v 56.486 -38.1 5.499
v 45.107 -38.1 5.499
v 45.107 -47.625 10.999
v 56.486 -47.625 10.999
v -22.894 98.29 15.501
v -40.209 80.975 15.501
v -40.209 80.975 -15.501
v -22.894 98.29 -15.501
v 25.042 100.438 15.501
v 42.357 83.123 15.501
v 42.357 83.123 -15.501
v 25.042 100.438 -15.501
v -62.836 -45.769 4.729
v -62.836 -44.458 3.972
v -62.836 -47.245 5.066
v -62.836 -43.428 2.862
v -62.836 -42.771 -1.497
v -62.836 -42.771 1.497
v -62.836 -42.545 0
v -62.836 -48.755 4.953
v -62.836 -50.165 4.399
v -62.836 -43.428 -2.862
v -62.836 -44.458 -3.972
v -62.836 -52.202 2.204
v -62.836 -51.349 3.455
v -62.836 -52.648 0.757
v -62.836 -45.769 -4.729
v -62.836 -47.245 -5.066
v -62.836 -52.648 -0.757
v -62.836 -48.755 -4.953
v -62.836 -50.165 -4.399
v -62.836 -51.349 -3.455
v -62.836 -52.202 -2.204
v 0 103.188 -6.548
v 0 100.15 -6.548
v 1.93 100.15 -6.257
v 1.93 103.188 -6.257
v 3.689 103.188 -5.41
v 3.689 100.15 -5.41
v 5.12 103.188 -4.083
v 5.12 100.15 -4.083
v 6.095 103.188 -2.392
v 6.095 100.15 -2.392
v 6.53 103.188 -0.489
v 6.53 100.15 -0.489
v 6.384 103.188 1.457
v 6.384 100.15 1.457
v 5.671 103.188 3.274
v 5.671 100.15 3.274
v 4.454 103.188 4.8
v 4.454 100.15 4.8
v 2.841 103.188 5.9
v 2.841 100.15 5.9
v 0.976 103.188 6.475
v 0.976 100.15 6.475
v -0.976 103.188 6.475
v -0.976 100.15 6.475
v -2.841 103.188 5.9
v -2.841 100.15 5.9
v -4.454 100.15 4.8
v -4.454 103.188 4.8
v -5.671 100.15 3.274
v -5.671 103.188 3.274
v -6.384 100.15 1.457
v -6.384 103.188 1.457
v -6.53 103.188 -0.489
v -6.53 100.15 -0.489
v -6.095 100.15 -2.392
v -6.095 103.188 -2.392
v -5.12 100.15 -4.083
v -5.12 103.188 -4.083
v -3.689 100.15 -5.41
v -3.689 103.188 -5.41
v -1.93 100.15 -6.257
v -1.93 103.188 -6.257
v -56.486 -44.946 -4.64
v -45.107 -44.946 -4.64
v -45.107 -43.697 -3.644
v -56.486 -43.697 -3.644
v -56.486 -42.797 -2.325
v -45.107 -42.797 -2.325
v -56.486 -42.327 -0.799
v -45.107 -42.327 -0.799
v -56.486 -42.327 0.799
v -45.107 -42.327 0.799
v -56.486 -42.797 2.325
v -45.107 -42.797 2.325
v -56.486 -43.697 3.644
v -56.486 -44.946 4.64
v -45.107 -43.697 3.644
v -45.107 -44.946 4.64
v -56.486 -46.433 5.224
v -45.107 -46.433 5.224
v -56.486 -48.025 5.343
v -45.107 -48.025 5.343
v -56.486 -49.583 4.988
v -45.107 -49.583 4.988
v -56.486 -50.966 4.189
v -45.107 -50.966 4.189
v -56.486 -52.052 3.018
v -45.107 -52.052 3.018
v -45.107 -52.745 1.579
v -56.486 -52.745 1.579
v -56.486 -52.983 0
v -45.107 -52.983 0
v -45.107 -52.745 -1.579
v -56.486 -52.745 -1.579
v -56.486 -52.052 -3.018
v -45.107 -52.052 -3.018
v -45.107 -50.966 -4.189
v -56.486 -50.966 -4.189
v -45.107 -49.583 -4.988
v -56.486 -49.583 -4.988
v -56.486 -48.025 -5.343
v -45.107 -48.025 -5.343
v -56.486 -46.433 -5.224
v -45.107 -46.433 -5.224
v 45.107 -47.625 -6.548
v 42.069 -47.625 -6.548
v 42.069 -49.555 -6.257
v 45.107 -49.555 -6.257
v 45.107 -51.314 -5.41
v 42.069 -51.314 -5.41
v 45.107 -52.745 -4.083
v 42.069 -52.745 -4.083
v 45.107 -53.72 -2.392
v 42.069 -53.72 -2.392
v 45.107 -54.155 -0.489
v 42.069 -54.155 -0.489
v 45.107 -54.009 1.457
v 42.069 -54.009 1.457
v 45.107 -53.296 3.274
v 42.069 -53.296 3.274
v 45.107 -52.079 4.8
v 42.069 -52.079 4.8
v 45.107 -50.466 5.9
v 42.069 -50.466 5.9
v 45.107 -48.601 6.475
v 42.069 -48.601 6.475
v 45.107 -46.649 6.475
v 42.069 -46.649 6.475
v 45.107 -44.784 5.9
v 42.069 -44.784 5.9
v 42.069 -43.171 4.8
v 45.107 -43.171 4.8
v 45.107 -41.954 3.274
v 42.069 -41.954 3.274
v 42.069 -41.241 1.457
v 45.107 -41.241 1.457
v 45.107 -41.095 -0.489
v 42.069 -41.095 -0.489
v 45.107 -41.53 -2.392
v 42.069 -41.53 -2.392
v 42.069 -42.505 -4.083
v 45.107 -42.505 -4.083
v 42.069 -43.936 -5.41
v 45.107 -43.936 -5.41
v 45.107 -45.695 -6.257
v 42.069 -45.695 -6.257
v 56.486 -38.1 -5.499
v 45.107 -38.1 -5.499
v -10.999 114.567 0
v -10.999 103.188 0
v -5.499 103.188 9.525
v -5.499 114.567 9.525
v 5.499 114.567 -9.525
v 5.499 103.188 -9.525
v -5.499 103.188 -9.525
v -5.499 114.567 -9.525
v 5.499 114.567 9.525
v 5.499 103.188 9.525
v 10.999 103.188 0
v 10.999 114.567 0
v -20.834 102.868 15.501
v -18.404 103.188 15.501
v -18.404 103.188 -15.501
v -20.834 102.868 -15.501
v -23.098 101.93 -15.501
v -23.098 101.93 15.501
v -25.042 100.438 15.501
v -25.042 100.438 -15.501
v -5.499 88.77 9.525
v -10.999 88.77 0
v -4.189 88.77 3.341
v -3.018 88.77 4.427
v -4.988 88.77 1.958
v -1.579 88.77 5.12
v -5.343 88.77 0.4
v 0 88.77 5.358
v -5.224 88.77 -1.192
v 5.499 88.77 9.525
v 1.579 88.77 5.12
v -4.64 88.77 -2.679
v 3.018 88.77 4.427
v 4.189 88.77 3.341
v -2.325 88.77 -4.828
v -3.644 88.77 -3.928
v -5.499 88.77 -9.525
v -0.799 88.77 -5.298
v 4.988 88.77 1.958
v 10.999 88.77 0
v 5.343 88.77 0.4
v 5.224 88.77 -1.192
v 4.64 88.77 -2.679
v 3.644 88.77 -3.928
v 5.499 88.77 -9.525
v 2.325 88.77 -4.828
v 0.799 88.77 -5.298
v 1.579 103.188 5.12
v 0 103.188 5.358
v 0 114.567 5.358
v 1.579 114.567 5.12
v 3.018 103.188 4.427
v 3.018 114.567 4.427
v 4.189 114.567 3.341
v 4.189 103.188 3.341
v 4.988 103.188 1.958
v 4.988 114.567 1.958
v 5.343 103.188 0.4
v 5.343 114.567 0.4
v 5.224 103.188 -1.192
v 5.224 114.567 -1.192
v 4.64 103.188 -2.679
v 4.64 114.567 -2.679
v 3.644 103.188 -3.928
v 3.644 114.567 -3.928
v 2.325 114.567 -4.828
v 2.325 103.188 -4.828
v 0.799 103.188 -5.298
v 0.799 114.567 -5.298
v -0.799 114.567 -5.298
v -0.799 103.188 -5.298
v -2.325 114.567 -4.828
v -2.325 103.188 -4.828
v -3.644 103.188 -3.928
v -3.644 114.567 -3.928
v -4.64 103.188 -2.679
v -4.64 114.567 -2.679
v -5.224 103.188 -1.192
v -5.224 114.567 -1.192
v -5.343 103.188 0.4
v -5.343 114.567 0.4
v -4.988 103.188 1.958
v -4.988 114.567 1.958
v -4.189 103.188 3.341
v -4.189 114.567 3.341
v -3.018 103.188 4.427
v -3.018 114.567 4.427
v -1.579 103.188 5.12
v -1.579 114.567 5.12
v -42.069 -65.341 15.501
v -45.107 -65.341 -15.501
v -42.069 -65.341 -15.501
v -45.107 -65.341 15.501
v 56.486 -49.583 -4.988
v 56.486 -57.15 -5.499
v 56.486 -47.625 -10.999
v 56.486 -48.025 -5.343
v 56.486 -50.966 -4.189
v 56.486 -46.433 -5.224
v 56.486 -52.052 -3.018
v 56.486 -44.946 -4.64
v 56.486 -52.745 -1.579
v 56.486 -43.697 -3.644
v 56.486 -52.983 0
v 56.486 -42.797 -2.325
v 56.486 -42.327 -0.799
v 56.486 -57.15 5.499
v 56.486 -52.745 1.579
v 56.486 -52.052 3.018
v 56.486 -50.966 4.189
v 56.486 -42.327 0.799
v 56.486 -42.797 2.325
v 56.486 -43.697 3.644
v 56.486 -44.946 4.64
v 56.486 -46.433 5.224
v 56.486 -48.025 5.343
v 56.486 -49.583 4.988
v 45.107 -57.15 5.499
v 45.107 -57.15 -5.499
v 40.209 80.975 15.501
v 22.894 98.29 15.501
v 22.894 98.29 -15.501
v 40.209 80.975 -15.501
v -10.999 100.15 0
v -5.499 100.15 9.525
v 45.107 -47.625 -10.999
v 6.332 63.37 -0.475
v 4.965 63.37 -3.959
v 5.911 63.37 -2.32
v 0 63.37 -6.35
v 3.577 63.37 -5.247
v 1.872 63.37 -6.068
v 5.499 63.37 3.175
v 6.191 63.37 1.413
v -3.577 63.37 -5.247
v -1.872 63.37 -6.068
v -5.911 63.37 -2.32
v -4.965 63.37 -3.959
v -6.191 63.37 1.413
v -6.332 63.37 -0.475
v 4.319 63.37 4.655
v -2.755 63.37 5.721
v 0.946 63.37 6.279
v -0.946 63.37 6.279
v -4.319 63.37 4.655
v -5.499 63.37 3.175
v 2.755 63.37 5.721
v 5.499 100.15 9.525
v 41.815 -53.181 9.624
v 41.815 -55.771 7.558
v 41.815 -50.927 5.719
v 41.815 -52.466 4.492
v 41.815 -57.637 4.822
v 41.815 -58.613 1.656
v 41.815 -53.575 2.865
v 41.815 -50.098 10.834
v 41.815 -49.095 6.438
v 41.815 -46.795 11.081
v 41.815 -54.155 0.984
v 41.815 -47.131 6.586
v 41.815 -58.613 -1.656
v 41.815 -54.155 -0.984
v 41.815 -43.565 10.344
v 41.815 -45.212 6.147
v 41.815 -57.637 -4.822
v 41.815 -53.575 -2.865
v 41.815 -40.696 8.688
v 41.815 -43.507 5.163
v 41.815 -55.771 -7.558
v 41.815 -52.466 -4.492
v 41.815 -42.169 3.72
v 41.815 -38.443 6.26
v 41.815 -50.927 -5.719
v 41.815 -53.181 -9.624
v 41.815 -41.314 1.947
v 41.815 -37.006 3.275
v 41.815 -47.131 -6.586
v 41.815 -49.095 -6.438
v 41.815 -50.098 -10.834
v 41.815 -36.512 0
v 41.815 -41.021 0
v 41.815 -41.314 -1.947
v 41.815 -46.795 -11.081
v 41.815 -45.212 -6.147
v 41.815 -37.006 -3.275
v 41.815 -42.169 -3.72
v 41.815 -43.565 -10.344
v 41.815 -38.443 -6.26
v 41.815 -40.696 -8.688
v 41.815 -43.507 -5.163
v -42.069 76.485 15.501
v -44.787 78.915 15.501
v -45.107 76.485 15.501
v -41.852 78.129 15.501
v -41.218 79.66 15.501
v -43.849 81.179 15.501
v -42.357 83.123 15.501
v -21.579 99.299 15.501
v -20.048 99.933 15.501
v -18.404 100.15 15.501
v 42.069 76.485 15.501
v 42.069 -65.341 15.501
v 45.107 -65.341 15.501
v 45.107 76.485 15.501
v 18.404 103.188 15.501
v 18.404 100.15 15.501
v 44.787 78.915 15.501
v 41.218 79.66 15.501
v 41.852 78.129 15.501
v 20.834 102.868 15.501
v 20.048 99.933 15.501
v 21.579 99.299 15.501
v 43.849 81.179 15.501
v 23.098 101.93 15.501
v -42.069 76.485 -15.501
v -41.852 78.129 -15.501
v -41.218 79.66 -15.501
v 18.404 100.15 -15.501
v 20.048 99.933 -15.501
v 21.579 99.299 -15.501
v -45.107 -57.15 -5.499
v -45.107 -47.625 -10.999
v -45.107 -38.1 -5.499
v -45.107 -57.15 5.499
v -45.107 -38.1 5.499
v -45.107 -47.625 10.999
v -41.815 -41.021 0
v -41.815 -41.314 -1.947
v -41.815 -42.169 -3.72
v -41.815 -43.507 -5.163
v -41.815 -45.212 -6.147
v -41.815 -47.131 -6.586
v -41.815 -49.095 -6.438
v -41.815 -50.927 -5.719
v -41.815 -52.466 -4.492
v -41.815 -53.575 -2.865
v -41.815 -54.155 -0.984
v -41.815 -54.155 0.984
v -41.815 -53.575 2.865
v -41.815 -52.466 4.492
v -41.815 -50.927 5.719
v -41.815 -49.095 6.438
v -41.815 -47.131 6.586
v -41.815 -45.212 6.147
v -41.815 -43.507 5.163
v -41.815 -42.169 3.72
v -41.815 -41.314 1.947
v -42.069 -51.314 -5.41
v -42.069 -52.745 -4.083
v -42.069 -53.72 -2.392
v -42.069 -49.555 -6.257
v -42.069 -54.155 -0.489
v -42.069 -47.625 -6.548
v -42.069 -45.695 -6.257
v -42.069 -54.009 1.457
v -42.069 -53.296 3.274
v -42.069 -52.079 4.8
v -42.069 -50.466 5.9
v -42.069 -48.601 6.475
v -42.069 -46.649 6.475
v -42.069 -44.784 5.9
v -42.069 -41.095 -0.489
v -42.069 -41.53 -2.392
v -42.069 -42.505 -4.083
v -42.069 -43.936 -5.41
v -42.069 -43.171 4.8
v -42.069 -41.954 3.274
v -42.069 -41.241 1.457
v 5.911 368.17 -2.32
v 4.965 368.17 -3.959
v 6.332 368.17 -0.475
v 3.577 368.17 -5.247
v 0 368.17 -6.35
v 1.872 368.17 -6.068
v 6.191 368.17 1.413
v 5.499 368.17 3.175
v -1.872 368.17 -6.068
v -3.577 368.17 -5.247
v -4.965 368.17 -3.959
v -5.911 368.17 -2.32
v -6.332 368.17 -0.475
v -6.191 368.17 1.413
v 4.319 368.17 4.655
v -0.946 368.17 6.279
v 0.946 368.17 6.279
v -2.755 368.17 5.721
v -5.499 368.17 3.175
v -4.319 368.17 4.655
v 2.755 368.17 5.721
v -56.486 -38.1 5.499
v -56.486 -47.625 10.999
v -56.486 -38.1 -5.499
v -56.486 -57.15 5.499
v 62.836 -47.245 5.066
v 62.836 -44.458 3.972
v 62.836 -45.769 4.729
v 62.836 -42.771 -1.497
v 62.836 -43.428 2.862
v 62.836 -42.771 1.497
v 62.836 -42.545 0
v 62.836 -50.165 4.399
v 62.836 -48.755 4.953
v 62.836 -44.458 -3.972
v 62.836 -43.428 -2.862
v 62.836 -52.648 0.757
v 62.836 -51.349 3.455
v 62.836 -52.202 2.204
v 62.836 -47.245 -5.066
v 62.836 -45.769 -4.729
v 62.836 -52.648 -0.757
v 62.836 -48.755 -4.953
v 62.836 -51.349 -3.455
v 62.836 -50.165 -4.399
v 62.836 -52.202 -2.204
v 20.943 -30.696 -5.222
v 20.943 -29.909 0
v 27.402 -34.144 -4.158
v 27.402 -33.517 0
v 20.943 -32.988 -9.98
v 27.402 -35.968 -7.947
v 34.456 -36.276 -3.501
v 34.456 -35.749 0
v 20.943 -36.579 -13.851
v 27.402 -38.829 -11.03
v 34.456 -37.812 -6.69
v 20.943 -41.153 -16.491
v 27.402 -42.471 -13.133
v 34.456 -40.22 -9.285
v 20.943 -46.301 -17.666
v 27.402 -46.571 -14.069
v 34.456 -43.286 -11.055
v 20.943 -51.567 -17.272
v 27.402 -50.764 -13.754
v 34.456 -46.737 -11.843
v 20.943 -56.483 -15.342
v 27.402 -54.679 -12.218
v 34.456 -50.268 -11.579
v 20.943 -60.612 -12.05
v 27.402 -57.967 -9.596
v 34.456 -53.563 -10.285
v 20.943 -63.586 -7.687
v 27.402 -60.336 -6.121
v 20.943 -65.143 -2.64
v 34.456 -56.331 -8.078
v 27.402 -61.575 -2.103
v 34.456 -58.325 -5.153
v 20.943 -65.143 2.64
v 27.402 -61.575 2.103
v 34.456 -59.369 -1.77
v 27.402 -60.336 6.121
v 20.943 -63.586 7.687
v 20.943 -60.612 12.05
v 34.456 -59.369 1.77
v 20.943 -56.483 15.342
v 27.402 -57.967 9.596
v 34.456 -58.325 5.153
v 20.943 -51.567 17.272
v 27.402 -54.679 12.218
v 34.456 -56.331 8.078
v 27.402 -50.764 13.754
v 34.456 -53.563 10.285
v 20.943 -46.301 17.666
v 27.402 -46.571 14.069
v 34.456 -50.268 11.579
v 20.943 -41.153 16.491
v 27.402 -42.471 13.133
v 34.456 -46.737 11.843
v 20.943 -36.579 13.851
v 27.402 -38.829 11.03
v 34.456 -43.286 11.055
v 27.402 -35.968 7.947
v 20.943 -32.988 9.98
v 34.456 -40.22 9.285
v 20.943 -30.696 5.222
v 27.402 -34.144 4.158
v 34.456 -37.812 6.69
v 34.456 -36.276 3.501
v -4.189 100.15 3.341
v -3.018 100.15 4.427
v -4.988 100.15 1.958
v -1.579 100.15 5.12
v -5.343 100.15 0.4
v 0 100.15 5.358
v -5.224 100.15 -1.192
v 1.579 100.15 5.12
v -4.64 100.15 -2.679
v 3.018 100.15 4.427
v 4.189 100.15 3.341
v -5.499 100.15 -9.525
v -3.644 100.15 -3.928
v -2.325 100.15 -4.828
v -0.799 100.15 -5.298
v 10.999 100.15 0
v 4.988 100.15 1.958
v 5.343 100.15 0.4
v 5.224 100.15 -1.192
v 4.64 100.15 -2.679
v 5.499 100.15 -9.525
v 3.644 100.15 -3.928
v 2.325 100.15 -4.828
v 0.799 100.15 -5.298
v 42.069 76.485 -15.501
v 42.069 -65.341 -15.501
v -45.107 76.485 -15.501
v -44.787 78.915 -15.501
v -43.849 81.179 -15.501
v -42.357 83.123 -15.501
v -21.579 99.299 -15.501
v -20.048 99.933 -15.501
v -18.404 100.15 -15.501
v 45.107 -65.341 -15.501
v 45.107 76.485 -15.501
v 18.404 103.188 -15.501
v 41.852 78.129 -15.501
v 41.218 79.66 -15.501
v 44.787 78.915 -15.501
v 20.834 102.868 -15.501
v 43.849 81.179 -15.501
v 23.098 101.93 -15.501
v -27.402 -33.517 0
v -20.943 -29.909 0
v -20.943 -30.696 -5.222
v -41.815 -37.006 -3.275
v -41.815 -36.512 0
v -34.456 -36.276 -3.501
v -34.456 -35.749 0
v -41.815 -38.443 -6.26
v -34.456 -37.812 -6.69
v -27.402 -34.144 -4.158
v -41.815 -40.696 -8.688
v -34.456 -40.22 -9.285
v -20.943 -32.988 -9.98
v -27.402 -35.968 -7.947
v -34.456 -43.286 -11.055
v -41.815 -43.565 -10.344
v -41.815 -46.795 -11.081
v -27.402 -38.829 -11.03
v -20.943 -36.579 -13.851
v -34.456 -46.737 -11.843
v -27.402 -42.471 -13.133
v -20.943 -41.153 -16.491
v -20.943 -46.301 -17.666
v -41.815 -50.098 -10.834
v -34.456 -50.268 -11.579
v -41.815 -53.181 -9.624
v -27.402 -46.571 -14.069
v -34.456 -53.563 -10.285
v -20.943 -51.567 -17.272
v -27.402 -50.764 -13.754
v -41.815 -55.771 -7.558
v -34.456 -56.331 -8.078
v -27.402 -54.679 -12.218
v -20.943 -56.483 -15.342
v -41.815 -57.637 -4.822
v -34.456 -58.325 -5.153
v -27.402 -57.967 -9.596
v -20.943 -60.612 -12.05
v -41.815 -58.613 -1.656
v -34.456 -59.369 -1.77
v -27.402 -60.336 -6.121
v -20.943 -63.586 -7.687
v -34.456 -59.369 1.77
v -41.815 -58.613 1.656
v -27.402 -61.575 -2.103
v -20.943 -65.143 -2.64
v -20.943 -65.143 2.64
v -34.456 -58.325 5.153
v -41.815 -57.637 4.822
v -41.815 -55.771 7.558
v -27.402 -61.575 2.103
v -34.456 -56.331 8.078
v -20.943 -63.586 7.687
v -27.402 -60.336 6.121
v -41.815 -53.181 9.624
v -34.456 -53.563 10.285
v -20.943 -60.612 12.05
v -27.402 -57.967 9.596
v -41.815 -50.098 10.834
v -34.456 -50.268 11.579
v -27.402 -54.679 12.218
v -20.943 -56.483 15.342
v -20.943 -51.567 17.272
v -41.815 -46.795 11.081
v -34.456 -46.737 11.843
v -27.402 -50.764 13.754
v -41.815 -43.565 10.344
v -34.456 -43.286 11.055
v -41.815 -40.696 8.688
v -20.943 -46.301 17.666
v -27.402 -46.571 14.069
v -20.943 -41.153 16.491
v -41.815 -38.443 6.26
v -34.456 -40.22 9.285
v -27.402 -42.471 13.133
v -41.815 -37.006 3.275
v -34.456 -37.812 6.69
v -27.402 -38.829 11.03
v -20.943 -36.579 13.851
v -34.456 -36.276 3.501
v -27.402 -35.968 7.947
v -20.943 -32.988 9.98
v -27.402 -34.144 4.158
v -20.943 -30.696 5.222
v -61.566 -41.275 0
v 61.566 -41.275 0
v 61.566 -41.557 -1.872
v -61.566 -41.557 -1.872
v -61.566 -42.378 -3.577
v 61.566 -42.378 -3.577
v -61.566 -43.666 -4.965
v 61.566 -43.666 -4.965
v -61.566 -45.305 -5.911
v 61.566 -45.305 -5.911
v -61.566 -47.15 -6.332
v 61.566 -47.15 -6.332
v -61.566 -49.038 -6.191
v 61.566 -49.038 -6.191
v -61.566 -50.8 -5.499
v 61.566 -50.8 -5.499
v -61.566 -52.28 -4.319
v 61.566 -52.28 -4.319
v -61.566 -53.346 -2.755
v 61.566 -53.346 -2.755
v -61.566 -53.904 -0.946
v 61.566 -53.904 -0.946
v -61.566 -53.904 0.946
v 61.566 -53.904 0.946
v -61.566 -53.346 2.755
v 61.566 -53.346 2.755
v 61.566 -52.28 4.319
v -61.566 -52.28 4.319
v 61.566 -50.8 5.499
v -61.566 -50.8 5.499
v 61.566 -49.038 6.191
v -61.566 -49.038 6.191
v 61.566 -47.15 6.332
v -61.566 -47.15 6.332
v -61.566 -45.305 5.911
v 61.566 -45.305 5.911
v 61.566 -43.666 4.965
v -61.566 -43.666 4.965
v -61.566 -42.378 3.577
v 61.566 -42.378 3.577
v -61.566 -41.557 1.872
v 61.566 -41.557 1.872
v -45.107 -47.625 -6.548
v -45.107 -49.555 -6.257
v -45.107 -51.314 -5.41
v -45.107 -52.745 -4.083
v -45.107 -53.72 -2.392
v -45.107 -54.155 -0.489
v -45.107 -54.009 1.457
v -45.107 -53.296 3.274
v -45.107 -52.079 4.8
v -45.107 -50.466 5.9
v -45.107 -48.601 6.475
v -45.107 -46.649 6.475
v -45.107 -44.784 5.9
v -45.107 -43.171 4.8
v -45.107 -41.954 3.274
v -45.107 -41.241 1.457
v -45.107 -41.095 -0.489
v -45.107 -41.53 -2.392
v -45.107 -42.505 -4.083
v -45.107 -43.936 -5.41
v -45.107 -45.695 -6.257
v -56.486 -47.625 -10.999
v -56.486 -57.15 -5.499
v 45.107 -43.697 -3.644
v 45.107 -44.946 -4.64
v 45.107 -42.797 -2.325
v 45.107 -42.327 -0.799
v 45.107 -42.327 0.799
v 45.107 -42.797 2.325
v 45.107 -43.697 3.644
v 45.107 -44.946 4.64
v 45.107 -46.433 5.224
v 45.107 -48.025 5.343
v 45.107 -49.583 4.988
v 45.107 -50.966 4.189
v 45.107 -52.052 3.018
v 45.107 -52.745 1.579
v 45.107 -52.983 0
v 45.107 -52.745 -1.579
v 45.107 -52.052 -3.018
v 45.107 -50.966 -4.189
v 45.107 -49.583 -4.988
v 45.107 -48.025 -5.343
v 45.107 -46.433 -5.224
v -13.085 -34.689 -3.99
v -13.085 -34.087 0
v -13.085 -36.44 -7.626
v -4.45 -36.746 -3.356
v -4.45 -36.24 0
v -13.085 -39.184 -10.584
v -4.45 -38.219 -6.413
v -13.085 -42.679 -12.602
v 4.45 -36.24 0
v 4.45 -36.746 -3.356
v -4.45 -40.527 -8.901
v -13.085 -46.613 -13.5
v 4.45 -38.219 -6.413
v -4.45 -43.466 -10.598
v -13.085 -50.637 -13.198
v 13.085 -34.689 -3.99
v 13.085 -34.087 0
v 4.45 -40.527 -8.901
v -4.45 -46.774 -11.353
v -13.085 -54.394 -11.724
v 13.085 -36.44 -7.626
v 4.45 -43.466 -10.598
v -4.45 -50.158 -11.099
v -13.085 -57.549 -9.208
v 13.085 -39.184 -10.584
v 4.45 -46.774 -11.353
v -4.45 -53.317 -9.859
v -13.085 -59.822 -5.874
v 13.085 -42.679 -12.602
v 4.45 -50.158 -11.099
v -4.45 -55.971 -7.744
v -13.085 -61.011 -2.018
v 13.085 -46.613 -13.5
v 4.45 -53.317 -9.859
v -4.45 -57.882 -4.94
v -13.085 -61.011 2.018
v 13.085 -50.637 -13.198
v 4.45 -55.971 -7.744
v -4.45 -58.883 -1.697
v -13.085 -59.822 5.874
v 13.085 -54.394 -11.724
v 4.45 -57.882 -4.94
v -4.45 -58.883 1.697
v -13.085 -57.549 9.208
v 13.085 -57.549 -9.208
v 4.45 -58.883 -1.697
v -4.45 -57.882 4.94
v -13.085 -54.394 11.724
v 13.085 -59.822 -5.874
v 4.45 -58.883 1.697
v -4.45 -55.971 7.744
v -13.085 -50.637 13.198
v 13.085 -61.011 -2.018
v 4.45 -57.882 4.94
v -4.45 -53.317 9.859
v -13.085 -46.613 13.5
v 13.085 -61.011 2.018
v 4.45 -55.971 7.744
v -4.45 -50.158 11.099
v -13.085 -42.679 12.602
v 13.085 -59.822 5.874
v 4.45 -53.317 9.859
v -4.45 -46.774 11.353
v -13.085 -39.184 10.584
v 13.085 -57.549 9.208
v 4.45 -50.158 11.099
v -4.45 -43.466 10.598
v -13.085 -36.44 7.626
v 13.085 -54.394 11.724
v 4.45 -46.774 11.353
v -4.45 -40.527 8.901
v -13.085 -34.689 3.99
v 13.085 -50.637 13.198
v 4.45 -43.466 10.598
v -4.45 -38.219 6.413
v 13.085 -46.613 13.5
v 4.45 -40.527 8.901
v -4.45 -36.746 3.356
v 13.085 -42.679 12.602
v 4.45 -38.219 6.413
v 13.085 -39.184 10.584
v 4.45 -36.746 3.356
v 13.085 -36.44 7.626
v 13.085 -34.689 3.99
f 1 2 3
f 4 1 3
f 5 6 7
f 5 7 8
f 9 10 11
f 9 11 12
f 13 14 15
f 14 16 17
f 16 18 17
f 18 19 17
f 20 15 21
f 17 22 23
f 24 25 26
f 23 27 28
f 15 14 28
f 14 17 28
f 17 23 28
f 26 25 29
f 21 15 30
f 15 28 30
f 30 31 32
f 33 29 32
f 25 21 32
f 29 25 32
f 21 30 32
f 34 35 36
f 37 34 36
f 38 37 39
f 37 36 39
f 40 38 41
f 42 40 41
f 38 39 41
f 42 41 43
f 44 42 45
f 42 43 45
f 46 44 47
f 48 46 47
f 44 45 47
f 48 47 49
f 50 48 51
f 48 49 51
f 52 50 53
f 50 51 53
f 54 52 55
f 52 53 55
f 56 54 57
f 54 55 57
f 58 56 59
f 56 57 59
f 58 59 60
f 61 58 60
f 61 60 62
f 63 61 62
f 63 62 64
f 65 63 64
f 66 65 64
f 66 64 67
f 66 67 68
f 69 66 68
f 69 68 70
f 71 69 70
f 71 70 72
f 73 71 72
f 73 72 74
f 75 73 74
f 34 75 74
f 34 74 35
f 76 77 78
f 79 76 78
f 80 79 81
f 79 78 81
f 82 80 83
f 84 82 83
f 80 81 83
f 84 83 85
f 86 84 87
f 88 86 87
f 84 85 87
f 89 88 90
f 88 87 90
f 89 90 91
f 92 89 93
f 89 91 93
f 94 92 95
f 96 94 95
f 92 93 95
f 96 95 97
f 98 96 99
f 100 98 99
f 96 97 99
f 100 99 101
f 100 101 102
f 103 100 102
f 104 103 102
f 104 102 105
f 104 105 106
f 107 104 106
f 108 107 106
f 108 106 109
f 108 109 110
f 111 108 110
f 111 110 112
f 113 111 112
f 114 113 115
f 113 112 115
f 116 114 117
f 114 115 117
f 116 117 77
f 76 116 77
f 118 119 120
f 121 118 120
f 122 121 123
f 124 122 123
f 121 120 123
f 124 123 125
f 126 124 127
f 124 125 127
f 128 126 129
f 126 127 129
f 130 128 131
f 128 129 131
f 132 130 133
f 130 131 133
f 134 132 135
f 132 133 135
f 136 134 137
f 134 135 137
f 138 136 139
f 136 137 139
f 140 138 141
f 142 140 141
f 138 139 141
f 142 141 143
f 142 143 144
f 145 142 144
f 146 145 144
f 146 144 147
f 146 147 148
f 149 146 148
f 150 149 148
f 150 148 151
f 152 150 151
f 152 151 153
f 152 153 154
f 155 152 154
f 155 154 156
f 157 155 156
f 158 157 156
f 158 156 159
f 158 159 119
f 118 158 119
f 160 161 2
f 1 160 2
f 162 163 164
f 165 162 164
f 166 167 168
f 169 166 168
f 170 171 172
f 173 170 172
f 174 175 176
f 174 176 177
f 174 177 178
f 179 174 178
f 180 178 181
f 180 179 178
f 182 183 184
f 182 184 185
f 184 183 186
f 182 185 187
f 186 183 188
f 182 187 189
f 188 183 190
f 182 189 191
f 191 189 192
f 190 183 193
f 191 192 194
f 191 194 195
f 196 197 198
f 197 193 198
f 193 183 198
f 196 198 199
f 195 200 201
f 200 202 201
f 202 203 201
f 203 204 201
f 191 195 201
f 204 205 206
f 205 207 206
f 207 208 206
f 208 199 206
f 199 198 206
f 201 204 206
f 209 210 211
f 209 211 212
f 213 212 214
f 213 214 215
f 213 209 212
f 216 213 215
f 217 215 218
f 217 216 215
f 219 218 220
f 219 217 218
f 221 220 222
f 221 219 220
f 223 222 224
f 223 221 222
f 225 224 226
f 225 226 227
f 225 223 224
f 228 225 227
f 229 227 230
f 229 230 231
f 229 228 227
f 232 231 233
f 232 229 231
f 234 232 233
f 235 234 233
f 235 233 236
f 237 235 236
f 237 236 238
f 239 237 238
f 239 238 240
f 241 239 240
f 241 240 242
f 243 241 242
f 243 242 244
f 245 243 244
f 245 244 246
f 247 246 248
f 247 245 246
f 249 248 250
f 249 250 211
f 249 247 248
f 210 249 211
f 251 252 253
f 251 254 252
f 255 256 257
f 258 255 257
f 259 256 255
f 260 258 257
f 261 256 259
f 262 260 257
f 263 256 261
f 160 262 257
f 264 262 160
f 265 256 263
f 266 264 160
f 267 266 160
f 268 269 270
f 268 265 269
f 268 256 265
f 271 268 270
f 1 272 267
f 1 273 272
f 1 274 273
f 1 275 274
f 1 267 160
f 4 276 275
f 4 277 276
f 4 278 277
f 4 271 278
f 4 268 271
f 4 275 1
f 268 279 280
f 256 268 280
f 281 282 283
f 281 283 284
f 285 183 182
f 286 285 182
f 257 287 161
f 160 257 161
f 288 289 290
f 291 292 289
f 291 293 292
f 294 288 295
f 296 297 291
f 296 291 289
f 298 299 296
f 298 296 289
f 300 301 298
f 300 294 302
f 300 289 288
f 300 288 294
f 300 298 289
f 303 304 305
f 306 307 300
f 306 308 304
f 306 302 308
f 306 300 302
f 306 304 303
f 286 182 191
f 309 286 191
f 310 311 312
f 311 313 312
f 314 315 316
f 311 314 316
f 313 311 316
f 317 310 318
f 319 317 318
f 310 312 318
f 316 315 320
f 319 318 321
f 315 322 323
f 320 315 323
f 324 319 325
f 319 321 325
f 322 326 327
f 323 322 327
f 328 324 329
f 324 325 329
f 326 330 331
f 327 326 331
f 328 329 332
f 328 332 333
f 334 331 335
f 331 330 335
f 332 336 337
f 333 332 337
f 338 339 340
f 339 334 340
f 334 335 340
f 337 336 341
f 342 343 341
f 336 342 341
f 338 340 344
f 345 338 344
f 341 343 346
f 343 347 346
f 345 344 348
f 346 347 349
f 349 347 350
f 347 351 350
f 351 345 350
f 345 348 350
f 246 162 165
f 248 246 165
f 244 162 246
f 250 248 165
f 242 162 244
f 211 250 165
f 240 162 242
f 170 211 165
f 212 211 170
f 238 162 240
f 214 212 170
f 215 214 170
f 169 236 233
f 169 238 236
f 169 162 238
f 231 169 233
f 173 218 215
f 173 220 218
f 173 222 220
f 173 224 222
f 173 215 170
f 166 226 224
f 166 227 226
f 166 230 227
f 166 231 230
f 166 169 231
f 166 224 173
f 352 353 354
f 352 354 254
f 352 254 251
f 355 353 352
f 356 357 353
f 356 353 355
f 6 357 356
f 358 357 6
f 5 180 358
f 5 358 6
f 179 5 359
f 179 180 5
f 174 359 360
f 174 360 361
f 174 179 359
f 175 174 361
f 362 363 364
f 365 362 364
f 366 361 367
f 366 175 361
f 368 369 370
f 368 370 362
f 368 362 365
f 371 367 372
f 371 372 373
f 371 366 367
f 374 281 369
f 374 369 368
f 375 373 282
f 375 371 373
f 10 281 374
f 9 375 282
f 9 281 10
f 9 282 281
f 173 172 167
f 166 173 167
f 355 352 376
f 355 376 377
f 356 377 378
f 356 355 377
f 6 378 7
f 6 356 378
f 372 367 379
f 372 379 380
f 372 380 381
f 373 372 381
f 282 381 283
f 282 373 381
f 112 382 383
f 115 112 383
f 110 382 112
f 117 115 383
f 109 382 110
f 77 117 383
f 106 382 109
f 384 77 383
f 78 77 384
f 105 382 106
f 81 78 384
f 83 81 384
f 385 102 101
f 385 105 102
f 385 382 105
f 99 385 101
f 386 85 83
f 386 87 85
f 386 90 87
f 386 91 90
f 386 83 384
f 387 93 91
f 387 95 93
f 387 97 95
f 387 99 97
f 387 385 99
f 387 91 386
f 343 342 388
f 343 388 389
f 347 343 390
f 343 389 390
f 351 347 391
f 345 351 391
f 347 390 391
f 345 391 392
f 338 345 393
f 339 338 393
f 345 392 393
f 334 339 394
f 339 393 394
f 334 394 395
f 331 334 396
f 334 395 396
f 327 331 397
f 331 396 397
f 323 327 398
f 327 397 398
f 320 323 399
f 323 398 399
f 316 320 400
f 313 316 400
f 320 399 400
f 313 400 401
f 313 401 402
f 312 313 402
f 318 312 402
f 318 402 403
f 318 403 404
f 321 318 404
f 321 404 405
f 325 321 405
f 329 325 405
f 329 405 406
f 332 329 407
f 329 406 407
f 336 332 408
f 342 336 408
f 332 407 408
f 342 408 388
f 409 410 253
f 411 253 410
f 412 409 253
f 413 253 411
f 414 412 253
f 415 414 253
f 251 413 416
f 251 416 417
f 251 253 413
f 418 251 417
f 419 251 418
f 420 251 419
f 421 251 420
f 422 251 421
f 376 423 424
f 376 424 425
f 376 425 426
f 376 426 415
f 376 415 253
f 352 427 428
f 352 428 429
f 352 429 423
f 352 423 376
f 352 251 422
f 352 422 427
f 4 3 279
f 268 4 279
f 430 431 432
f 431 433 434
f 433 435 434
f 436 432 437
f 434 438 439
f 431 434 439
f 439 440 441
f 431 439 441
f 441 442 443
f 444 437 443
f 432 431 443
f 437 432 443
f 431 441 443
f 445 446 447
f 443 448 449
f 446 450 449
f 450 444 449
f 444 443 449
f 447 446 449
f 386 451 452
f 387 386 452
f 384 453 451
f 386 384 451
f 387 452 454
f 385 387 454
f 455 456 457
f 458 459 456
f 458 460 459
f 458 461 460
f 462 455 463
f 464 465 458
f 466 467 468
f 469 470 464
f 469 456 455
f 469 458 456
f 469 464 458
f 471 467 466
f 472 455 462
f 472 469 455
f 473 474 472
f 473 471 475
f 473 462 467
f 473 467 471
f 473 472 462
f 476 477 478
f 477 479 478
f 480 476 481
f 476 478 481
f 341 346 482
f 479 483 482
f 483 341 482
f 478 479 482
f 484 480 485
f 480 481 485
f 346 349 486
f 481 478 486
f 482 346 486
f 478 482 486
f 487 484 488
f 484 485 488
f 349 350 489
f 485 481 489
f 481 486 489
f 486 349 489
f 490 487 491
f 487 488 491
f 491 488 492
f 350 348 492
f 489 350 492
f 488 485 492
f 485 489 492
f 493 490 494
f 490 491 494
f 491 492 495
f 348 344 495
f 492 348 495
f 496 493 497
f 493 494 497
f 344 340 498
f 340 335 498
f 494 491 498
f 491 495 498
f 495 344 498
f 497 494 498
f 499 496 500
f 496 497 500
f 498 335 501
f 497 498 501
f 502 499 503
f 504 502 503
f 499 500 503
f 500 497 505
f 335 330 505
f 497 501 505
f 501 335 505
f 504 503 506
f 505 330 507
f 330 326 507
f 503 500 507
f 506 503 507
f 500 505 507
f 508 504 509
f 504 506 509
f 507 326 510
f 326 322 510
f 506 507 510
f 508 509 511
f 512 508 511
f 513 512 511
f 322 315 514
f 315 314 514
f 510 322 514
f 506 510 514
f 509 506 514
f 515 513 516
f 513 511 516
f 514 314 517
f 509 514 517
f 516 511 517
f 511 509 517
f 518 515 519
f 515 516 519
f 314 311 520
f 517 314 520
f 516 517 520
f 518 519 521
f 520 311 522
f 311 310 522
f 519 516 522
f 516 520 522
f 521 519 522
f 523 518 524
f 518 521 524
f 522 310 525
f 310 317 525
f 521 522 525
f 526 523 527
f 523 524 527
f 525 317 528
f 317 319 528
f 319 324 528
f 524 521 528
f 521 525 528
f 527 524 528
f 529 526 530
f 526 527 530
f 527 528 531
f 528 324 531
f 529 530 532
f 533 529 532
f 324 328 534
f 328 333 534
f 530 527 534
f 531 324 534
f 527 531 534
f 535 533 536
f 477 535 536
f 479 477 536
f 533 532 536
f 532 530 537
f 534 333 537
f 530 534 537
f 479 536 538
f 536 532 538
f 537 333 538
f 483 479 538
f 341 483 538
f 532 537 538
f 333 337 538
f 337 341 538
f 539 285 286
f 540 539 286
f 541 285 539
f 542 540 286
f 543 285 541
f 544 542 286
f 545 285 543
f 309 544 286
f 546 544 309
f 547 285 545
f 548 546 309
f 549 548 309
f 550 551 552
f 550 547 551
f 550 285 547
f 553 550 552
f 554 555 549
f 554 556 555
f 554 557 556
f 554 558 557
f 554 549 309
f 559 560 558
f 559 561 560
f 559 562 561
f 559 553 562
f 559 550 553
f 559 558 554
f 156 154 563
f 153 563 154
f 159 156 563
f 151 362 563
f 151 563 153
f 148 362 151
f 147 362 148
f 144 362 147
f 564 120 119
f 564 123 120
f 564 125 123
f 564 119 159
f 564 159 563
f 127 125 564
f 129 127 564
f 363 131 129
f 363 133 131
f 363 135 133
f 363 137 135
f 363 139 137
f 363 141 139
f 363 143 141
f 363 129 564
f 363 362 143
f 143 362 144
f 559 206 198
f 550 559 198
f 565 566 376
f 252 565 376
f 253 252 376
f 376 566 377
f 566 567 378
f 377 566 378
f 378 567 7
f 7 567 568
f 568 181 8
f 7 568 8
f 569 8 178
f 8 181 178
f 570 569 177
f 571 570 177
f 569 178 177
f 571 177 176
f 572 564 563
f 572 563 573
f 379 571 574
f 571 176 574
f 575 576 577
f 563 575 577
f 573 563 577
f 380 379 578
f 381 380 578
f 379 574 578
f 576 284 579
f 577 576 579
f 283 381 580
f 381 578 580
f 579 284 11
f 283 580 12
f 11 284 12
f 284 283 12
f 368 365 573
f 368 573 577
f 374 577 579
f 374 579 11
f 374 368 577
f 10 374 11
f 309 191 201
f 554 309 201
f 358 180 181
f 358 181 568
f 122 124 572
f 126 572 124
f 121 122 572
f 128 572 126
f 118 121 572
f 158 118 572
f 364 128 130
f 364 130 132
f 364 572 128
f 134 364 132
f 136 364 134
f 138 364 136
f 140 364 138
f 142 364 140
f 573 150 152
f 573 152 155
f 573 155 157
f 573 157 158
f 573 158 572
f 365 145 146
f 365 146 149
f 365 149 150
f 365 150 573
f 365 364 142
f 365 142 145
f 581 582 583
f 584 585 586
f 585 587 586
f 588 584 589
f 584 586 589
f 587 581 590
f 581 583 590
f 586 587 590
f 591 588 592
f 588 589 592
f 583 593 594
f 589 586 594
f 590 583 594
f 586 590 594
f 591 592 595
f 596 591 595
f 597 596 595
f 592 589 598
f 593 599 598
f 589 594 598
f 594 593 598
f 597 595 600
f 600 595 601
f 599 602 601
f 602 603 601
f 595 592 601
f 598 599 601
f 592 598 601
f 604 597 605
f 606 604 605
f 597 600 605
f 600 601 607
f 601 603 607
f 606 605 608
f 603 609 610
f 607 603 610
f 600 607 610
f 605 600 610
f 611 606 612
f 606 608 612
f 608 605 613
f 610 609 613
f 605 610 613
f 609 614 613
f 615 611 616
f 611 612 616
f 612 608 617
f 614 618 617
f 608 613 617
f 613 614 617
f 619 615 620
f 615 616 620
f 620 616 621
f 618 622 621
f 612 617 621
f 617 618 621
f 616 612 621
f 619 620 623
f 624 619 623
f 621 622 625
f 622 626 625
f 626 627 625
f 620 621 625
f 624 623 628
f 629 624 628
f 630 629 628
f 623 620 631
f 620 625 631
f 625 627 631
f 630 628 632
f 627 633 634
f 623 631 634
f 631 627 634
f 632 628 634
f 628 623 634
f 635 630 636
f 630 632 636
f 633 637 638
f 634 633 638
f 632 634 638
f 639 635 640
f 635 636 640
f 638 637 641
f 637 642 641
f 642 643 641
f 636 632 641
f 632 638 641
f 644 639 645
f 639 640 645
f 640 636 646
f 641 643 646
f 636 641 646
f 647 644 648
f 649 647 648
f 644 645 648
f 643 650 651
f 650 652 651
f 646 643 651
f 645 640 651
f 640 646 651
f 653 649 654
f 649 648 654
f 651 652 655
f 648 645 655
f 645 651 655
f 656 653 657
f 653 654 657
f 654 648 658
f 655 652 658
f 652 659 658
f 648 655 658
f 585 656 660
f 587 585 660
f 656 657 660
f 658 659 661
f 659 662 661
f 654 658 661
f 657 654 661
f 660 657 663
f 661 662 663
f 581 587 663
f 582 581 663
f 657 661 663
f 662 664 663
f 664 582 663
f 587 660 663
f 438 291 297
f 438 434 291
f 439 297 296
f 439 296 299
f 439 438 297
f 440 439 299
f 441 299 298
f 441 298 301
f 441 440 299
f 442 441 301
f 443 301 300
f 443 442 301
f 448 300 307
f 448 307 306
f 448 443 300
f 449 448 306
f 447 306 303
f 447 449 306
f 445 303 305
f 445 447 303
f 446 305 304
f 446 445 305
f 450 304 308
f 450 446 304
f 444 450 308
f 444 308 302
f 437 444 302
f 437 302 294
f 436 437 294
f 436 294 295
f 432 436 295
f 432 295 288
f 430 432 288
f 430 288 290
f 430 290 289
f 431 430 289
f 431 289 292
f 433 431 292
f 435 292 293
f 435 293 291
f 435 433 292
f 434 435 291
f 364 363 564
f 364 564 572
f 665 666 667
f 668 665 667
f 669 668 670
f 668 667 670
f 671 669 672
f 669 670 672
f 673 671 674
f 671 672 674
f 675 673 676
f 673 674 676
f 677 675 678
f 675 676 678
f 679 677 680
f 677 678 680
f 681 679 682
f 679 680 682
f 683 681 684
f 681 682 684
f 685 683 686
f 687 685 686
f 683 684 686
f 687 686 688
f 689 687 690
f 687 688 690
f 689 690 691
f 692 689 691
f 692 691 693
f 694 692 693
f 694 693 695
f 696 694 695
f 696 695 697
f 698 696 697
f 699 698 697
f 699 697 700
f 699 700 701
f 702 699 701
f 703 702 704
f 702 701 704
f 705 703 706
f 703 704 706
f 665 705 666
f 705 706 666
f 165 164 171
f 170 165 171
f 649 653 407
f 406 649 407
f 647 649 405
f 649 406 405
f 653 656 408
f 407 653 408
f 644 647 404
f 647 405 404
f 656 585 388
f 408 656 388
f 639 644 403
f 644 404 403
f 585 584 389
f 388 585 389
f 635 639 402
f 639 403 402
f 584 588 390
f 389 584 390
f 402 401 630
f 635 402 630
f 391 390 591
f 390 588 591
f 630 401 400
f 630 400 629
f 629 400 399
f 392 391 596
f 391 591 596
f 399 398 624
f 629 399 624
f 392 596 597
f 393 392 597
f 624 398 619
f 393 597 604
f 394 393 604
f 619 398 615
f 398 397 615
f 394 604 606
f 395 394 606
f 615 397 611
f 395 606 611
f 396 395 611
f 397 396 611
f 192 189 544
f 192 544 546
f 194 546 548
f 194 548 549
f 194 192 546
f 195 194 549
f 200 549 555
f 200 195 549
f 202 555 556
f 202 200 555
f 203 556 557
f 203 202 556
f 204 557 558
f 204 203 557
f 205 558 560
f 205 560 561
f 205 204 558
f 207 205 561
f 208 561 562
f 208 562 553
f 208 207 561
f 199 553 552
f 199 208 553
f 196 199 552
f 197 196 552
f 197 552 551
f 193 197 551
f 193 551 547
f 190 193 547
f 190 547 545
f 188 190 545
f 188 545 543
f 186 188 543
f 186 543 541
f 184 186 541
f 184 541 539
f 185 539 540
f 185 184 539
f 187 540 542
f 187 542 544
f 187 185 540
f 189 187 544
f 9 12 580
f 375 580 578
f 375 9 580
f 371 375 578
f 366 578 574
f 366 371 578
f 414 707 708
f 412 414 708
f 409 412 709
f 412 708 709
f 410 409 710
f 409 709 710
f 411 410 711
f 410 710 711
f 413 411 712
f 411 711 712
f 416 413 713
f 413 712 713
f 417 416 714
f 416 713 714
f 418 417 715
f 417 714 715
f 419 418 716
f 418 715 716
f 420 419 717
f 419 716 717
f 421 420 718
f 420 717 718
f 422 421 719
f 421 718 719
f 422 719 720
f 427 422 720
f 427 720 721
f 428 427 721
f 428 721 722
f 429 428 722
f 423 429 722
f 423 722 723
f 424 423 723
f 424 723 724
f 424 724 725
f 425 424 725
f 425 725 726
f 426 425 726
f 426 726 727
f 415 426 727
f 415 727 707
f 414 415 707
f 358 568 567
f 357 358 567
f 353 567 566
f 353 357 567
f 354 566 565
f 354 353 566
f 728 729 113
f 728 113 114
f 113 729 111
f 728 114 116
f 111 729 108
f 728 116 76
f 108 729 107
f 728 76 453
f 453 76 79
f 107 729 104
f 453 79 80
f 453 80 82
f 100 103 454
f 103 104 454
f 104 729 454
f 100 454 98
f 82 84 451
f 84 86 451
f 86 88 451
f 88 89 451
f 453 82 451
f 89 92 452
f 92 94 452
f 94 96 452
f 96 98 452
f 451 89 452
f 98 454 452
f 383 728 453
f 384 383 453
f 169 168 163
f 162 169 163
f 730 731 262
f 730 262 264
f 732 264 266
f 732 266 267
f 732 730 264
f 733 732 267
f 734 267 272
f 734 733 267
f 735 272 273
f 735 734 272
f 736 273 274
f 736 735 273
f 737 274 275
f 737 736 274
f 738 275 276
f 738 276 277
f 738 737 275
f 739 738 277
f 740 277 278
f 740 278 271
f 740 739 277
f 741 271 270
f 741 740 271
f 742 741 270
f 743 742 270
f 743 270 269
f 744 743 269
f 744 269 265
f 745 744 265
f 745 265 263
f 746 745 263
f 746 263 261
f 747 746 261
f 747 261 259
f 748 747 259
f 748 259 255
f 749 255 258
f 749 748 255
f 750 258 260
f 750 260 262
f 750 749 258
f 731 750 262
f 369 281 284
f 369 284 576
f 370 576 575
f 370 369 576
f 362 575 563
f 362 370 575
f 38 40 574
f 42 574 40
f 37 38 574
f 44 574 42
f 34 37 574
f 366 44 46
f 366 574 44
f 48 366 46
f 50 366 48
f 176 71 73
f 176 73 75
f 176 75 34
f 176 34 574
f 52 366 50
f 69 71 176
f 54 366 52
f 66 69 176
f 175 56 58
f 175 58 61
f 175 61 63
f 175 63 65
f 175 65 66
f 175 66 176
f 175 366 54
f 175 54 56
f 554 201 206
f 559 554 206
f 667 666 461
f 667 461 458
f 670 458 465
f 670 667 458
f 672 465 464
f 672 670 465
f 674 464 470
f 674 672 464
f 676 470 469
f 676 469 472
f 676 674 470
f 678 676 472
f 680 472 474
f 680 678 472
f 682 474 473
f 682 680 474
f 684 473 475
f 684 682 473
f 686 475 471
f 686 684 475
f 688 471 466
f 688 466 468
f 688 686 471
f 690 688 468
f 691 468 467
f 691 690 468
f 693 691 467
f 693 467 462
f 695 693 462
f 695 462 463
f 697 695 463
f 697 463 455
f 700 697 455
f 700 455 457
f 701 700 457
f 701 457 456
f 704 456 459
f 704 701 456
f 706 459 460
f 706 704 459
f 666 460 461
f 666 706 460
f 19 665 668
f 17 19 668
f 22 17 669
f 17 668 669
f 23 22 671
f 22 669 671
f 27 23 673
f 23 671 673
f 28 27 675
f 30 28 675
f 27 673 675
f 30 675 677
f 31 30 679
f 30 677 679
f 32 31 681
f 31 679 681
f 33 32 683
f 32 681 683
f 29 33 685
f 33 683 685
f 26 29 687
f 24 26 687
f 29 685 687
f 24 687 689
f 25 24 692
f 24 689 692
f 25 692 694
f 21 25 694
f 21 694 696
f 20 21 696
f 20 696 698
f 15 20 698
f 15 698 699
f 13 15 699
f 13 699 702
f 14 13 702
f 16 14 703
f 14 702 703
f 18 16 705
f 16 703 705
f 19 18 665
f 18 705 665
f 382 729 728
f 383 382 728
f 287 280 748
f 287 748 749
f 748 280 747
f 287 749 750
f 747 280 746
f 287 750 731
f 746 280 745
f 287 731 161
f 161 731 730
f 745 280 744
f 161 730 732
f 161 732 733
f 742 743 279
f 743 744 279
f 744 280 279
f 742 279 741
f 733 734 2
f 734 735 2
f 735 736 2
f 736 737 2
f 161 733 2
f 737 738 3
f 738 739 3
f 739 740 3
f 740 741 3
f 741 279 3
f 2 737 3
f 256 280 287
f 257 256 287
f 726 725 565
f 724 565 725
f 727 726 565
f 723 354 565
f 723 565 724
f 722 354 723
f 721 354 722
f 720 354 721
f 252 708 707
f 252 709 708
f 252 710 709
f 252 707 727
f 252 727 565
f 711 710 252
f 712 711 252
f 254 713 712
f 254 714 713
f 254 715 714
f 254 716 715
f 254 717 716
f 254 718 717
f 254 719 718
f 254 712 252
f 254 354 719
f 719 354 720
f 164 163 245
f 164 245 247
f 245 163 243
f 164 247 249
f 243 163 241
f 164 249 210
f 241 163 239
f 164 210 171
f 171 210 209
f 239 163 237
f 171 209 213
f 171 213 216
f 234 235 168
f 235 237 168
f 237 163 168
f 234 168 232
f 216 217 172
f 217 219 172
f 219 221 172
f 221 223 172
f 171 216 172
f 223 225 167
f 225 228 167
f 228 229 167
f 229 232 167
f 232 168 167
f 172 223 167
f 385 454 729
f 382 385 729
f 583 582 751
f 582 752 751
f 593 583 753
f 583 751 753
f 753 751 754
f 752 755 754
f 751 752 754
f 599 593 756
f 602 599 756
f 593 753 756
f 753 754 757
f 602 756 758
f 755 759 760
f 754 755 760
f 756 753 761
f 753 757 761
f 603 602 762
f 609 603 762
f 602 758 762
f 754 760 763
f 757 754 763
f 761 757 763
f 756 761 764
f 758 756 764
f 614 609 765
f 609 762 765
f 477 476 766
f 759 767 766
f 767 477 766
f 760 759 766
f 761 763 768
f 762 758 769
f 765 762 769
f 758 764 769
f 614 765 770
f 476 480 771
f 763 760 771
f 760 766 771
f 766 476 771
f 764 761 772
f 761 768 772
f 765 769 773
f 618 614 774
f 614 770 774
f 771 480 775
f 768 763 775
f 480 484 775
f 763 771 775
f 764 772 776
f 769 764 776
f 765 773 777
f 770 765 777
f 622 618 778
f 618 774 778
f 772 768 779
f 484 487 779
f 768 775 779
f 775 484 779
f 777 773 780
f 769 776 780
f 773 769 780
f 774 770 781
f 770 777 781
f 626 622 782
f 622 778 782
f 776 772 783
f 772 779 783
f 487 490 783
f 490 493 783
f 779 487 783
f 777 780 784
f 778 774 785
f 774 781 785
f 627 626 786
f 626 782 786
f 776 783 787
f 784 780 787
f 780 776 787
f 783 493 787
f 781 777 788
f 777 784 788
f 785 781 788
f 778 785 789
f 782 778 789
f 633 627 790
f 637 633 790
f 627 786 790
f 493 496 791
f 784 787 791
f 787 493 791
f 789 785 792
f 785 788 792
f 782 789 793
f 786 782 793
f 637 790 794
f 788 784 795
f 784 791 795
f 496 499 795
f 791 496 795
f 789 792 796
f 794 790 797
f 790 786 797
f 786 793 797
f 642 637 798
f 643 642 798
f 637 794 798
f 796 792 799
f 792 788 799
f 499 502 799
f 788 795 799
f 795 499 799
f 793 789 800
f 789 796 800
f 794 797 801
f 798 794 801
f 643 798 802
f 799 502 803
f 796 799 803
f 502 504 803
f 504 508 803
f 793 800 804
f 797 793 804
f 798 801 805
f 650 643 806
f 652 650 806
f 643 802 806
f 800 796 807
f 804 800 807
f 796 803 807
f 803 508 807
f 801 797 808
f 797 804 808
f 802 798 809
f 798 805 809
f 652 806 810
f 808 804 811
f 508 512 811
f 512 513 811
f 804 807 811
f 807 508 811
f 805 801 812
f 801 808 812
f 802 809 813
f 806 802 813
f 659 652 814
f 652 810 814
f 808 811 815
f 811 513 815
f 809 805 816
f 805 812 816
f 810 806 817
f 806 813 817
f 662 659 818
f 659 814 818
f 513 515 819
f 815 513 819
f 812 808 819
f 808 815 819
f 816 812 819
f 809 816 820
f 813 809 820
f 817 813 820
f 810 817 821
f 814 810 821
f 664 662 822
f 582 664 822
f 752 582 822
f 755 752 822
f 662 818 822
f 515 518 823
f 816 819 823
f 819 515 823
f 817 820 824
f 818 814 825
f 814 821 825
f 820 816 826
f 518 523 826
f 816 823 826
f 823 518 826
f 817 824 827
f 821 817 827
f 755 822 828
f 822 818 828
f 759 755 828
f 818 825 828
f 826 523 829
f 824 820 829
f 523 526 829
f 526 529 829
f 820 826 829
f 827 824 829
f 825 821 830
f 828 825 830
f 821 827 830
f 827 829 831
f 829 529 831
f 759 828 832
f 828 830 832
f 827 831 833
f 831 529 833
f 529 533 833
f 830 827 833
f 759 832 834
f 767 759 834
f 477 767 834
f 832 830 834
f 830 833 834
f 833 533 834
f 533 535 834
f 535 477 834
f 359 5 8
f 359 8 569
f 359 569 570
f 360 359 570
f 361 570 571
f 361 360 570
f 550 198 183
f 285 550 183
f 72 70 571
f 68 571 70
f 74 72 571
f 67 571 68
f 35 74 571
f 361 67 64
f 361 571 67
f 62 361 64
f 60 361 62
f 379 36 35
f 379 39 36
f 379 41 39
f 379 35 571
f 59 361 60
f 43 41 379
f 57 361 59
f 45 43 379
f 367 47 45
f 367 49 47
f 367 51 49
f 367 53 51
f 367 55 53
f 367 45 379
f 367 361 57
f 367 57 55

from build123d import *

# Parameters (mm, degrees)
BASE_FLANGE1_DEPTH                = 15.50124711
F_1_2_CLEARANCE_HOLE2_D           = 13.09624
F_1_2_CLEARANCE_HOLE2_ON_FACE_2_D = 13.09624
NUT_SKETCH_R                      = 5.35813
NUT_DEPTH                         = 11.3792
BODY_MOVE_COPY3_ANGLE             = 158.9094188
ROLLER_SKETCH_W                   = 125.67158
ROLLER_SKETCH_H                   = 6.35
CHAMFER1_SIZE                     = 1.27
ROD_SKETCH_W                      = 6.35
ROD_SKETCH_H                      = 304.8


with BuildPart() as part:
    # Base-Flange1: sheet metal written as solids
    # Sketch1 → Base-Flange1 (new, symmetric)
    with BuildSketch(Plane.XY):
        with BuildLine():
            Line((-42.06875, -65.340710983), (-42.06875, 76.485028879))
            ThreePointArc((-42.06875, 76.485028879), (-41.585385031, 78.915068674), (-40.208878061, 80.975156939))
            Line((-40.208878061, 80.975156939), (-22.894246939, 98.289788061))
            ThreePointArc((-22.894246939, 98.289788061), (-20.834158674, 99.666295031), (-18.404118879, 100.14966))
            Line((-18.404118879, 100.14966), (18.404118879, 100.14966))
            ThreePointArc((18.404118879, 100.14966), (20.834158674, 99.666295031), (22.894246939, 98.289788061))
            Line((22.894246939, 98.289788061), (40.208878061, 80.975156939))
            ThreePointArc((40.208878061, 80.975156939), (41.585385031, 78.915068674), (42.06875, 76.485028879))
            Line((42.06875, 76.485028879), (42.06875, -65.340710983))
            Line((42.06875, -65.340710983), (45.10659, -65.340710983))
            Line((45.10659, -65.340710983), (45.10659, 76.485028879))
            ThreePointArc((45.10659, 76.485028879), (44.39198323, 80.077599713), (42.356955325, 83.123234204))
            Line((42.356955325, 83.123234204), (25.042324204, 100.437865325))
            ThreePointArc((25.042324204, 100.437865325), (21.996689713, 102.47289323), (18.404118879, 103.1875))
            Line((18.404118879, 103.1875), (-18.404118879, 103.1875))
            ThreePointArc((-18.404118879, 103.1875), (-21.996689713, 102.47289323), (-25.042324204, 100.437865325))
            Line((-25.042324204, 100.437865325), (-42.356955325, 83.123234204))
            ThreePointArc((-42.356955325, 83.123234204), (-44.39198323, 80.077599713), (-45.10659, 76.485028879))
            Line((-45.10659, 76.485028879), (-45.10659, -65.340710983))
            Line((-45.10659, -65.340710983), (-42.06875, -65.340710983))
        make_face()
    extrude(amount=BASE_FLANGE1_DEPTH, both=True)

    # 1/2 Clearance Hole2 (through all)
    with Locations(Plane.ZX.offset(103.1875)):
        with Locations((0, 0)):
            Hole(F_1_2_CLEARANCE_HOLE2_D / 2)

    # 1/2 Clearance Hole2 on face 2 (through all)
    with Locations(Plane(origin=(45.10659, -47.625, 0), x_dir=(0, 0, 1), z_dir=(1, 0, 0))):
        with Locations((0, 0)):
            Hole(F_1_2_CLEARANCE_HOLE2_ON_FACE_2_D / 2)


with BuildPart() as body_2:
    # Nut_Sketch → Nut (new body)
    with BuildSketch(Plane(origin=(0, 103.1875, 0), x_dir=(1, 0, 0), z_dir=(0, 1, 0))):
        Polygon((10.998522628, 0), (5.499261314, 9.525), (-5.499261314, 9.525), (-10.998522628, 0), (-5.499261314, -9.525), (5.499261314, -9.525), align=None)
        with Locations(Location((0, 0, 0), (0, 0, 270))):
            Circle(NUT_SKETCH_R, mode=Mode.SUBTRACT)
    extrude(amount=NUT_DEPTH)


with BuildPart() as body_3:
    # Body-Move/Copy1: read off the stored shape, not the designer's step
    # Body-Move/Copy1: copy of body 2
    add(body_2.part.moved(Location((0, -64.9213035, 0))))


with BuildPart() as body_4:
    # Body-Move_Copy1 2: copy of body 2
    add(body_2.part.moved(Location((0, -32.4606518, 0))))


with BuildPart() as body_4_1:
    # Body-Move/Copy2: read off the stored shape, not the designer's step
    # Body-Move/Copy2: moved
    add(body_4.part.moved(Location((0, 18.0436118, 0))))


with BuildPart() as body_3_1:
    # Body-Move/Copy3: read off the stored shape, not the designer's step
    # Body-Move/Copy3: moved
    add(body_3.part.moved(Location((-41.2444599, 6.8403935, -23.8125))).rotate(Axis((0, 0, 0), (-0.6947465906, -0.6947465906, -0.1861567879)), BODY_MOVE_COPY3_ANGLE))


with BuildPart() as body_5:
    # Roller_Sketch → Roller (revolve)
    with BuildSketch(Plane.XY):
        with Locations((0, -44.45)):
            Rectangle(ROLLER_SKETCH_W, ROLLER_SKETCH_H)
        with BuildLine():
            Line((41.81475, -36.51243161), (41.81475, -41.021))
            Line((41.81475, -41.021), (0, -41.021))
            Line((0, -41.021), (-41.81475, -41.021))
            Line((-41.81475, -41.021), (-41.81475, -36.51243161))
            ThreePointArc((-41.81475, -36.51243161), (-30.872204648, -34.811948524), (-20.942709632, -29.909289017))
            ThreePointArc((-20.942709632, -29.909289017), (0, -36.5125), (20.942709632, -29.909289017))
            ThreePointArc((20.942709632, -29.909289017), (30.872204648, -34.811948524), (41.81475, -36.51243161))
        make_face()
    revolve(axis=Axis((116.797860072, -47.625, 0), (-1, 0, 0)))

    # Chamfer1
    chamfer1_edges = [body_5.edges().sort_by_distance(p)[0] for p in [
        (-62.83579, -53.975, 0),
        (62.83579, -53.975, 0),
    ]]
    chamfer(chamfer1_edges, length=CHAMFER1_SIZE)


with BuildPart() as body_6:
    # Mirror1: mirrored copy
    add(body_3_1.part.mirror(Plane(origin=(0, 0, 0), x_dir=(0, 0, 1), z_dir=(1, 0, 0))))


with BuildPart() as body_7:
    # Rod_Sketch → Rod (revolve)
    with BuildSketch(Plane.XY, mode=Mode.PRIVATE) as rod_sk:
        with Locations((3.175, 215.77046)):
            Rectangle(ROD_SKETCH_W, ROD_SKETCH_H)
    revolve(rod_sk.sketch.rotate(Axis((0, 0, 0), (0, 1, 0)), 90), axis=Axis((0, 0, 0), (0, 1, 0)))


solid = Compound([part.part, body_2.part, body_4_1.part, body_3_1.part, body_5.part, body_6.part, body_7.part])
